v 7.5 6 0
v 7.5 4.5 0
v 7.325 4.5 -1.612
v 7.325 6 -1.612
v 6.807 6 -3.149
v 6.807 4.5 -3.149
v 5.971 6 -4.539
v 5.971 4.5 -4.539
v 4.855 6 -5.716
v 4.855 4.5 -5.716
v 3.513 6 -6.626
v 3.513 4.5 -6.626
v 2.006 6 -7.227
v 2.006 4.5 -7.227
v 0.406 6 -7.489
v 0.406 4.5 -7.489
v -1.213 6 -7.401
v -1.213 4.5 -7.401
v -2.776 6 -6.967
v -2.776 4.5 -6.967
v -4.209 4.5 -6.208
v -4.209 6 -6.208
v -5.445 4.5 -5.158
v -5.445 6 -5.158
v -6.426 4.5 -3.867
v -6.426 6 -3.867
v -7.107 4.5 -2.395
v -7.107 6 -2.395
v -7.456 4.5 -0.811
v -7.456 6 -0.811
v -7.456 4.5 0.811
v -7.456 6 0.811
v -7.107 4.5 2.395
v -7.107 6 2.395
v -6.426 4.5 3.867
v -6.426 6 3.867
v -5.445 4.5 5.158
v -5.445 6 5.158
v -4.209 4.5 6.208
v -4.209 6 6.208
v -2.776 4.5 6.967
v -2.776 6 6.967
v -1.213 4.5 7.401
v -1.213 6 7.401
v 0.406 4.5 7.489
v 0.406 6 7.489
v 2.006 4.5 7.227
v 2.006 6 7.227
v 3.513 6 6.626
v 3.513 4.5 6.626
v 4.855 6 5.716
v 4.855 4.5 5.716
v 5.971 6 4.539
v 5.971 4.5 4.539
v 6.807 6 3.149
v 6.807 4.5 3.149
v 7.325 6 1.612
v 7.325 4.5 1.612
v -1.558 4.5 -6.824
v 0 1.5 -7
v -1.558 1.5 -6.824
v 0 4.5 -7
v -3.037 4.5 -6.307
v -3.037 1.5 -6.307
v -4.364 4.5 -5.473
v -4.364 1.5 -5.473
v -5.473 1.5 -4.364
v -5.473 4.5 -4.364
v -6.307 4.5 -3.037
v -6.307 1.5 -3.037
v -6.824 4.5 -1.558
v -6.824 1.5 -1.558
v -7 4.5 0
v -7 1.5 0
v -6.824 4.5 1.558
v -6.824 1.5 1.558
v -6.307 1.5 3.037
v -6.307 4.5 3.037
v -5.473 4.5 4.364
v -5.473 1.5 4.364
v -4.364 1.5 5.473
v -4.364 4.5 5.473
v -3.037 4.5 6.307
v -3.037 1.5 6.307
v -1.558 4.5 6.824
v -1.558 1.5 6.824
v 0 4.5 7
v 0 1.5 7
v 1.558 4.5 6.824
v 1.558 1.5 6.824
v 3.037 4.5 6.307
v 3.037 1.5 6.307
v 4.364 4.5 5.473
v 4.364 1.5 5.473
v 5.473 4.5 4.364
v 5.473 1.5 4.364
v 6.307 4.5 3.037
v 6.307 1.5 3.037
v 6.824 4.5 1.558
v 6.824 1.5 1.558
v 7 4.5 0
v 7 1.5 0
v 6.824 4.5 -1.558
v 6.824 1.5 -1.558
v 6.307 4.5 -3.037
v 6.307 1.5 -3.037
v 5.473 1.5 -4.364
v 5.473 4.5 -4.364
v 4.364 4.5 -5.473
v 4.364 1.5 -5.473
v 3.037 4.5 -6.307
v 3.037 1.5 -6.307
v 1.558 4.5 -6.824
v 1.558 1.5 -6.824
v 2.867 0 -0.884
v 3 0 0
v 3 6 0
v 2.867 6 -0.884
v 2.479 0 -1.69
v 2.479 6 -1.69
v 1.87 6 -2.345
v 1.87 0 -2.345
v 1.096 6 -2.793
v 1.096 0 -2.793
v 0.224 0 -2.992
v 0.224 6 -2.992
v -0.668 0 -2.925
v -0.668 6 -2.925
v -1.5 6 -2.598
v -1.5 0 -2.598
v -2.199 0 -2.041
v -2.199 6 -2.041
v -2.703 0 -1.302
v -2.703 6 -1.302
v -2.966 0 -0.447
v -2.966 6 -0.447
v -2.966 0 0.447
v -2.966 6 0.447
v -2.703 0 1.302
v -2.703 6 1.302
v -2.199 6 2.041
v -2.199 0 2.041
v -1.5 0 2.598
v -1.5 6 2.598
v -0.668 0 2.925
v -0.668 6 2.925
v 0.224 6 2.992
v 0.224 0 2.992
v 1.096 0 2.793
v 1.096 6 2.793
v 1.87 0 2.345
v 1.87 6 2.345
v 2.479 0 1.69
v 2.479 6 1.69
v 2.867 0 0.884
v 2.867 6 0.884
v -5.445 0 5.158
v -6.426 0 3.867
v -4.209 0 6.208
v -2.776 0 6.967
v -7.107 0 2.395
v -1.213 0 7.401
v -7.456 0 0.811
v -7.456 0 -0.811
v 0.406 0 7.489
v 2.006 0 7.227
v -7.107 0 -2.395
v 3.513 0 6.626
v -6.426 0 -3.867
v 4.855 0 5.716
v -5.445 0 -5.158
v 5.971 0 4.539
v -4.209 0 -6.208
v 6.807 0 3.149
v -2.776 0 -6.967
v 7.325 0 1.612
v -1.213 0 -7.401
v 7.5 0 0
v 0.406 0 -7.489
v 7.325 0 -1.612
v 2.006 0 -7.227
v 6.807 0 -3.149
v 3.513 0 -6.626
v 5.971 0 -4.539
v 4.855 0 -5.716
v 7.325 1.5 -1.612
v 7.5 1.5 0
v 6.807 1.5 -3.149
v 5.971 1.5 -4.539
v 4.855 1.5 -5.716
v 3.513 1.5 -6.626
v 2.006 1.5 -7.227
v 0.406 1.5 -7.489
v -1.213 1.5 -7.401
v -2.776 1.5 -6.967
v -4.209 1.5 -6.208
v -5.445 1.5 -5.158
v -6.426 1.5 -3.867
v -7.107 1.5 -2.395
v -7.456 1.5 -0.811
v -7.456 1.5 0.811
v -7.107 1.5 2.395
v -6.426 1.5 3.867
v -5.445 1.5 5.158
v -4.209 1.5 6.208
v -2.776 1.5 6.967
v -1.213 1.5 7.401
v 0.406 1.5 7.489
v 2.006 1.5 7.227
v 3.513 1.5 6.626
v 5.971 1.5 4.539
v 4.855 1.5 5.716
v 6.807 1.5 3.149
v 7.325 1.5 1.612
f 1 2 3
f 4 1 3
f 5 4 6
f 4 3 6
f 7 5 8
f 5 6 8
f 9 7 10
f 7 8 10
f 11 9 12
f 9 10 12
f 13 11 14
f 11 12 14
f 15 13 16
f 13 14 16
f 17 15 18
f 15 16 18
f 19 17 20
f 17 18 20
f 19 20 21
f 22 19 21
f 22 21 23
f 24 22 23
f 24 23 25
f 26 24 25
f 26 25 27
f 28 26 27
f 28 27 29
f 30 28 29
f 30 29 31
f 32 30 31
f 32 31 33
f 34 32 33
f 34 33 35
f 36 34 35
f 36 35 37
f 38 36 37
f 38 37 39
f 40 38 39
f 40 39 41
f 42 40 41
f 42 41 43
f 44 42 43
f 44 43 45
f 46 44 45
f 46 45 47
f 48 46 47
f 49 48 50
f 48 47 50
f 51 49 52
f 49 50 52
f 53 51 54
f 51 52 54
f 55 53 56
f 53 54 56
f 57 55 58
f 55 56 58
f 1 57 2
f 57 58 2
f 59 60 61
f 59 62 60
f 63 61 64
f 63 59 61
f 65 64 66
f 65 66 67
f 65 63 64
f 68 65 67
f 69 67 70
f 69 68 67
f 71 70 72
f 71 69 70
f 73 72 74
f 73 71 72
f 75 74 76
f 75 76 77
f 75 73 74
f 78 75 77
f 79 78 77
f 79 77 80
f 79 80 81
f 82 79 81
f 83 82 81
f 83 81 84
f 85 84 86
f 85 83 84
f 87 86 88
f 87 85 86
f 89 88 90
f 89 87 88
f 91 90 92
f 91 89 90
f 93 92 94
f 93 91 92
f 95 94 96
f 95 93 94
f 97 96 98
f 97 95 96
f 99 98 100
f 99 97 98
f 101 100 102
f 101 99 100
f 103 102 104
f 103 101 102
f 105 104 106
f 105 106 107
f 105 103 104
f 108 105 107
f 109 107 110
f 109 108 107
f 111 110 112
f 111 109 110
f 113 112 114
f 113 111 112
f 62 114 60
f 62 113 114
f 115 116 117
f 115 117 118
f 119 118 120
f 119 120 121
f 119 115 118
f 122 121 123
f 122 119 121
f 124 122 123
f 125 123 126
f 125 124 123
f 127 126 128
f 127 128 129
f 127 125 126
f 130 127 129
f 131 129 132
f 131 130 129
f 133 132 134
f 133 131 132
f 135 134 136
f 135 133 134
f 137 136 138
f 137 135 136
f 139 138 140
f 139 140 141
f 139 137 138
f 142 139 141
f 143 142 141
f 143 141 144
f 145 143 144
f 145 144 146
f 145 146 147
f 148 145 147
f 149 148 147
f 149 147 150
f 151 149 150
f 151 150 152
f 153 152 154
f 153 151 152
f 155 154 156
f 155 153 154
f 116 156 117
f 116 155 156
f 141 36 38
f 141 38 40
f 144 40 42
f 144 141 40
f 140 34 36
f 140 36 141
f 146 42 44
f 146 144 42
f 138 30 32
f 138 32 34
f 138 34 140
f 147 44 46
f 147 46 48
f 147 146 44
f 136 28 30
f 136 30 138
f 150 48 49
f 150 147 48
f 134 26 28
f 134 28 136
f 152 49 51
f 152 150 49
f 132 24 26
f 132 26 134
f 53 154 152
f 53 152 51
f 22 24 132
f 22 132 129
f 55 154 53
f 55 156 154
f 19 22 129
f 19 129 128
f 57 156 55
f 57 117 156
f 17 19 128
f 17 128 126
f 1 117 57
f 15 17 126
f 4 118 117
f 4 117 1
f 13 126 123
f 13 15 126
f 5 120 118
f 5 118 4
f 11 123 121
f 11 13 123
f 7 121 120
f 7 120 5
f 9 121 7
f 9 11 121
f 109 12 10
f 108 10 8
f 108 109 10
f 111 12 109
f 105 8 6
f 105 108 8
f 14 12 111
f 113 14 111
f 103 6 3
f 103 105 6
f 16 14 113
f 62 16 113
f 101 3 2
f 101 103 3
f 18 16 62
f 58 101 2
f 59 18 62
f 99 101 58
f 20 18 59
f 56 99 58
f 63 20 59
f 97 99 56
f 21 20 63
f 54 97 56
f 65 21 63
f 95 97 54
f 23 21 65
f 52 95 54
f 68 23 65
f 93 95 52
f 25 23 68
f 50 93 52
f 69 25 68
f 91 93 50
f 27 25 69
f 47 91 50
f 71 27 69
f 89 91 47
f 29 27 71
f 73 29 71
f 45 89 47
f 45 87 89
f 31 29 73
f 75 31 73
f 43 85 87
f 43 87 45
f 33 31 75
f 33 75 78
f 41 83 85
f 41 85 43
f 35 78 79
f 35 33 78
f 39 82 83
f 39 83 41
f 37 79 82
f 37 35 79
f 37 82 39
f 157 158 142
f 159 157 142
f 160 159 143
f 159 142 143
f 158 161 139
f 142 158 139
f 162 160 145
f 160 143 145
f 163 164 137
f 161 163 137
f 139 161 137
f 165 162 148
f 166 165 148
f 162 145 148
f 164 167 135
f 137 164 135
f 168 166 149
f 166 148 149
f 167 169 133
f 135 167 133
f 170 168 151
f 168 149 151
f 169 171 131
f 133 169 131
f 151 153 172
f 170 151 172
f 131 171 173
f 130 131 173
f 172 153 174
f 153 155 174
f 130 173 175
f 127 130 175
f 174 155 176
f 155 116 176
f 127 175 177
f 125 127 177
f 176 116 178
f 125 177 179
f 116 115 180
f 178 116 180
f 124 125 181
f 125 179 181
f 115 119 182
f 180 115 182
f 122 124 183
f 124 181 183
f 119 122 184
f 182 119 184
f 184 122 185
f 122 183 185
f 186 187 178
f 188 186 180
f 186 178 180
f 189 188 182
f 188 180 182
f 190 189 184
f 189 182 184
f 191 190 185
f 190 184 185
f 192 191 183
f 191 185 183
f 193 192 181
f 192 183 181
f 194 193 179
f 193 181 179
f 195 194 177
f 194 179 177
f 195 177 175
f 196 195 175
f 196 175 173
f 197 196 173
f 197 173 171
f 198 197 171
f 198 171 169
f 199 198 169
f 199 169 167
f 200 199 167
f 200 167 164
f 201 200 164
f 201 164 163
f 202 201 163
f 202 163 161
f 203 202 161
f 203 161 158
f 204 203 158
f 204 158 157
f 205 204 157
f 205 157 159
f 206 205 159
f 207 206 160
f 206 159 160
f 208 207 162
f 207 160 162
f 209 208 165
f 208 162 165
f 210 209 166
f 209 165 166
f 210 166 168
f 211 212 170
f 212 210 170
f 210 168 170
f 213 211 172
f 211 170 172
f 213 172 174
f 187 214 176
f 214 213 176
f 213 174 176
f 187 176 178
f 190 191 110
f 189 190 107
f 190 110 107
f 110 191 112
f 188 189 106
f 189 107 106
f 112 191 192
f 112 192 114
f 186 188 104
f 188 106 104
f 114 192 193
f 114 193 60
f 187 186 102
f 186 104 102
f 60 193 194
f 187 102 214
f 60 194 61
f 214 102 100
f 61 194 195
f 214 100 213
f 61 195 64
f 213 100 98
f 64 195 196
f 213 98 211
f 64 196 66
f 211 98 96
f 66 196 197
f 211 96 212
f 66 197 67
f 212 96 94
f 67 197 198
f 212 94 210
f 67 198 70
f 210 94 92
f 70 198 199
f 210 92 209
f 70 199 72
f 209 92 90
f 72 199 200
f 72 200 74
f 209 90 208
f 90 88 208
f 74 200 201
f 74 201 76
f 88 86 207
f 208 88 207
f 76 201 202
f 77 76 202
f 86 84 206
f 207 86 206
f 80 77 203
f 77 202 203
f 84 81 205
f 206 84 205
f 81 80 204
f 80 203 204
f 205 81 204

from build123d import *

# Parameters (mm, degrees)
SKETCH1_R           = 7.5
SKETCH1_R_2         = 3
BOSS_EXTRUDE1_DEPTH = 6
SKETCH2_W           = 0.5
SKETCH2_H           = 3


with BuildPart() as part:
    # Sketch1 → Boss-Extrude1 (new body)
    with BuildSketch(Plane(origin=(0, 0, 0), x_dir=(1, 0, 0), z_dir=(0, 1, 0))):
        Circle(SKETCH1_R)
        Circle(SKETCH1_R_2, mode=Mode.SUBTRACT)
    extrude(amount=BOSS_EXTRUDE1_DEPTH)

    # Sketch2 → Cut-Revolve1 (revolve, cut)
    with BuildSketch(Plane(origin=(0, 0, 0), x_dir=(0, 0, -1), z_dir=(1, 0, 0))):
        with Locations((7.25, 3)):
            Rectangle(SKETCH2_W, SKETCH2_H)
    revolve(axis=Axis((0, 0, 0), (0, 1, 0)), mode=Mode.SUBTRACT)


solid = part.part
